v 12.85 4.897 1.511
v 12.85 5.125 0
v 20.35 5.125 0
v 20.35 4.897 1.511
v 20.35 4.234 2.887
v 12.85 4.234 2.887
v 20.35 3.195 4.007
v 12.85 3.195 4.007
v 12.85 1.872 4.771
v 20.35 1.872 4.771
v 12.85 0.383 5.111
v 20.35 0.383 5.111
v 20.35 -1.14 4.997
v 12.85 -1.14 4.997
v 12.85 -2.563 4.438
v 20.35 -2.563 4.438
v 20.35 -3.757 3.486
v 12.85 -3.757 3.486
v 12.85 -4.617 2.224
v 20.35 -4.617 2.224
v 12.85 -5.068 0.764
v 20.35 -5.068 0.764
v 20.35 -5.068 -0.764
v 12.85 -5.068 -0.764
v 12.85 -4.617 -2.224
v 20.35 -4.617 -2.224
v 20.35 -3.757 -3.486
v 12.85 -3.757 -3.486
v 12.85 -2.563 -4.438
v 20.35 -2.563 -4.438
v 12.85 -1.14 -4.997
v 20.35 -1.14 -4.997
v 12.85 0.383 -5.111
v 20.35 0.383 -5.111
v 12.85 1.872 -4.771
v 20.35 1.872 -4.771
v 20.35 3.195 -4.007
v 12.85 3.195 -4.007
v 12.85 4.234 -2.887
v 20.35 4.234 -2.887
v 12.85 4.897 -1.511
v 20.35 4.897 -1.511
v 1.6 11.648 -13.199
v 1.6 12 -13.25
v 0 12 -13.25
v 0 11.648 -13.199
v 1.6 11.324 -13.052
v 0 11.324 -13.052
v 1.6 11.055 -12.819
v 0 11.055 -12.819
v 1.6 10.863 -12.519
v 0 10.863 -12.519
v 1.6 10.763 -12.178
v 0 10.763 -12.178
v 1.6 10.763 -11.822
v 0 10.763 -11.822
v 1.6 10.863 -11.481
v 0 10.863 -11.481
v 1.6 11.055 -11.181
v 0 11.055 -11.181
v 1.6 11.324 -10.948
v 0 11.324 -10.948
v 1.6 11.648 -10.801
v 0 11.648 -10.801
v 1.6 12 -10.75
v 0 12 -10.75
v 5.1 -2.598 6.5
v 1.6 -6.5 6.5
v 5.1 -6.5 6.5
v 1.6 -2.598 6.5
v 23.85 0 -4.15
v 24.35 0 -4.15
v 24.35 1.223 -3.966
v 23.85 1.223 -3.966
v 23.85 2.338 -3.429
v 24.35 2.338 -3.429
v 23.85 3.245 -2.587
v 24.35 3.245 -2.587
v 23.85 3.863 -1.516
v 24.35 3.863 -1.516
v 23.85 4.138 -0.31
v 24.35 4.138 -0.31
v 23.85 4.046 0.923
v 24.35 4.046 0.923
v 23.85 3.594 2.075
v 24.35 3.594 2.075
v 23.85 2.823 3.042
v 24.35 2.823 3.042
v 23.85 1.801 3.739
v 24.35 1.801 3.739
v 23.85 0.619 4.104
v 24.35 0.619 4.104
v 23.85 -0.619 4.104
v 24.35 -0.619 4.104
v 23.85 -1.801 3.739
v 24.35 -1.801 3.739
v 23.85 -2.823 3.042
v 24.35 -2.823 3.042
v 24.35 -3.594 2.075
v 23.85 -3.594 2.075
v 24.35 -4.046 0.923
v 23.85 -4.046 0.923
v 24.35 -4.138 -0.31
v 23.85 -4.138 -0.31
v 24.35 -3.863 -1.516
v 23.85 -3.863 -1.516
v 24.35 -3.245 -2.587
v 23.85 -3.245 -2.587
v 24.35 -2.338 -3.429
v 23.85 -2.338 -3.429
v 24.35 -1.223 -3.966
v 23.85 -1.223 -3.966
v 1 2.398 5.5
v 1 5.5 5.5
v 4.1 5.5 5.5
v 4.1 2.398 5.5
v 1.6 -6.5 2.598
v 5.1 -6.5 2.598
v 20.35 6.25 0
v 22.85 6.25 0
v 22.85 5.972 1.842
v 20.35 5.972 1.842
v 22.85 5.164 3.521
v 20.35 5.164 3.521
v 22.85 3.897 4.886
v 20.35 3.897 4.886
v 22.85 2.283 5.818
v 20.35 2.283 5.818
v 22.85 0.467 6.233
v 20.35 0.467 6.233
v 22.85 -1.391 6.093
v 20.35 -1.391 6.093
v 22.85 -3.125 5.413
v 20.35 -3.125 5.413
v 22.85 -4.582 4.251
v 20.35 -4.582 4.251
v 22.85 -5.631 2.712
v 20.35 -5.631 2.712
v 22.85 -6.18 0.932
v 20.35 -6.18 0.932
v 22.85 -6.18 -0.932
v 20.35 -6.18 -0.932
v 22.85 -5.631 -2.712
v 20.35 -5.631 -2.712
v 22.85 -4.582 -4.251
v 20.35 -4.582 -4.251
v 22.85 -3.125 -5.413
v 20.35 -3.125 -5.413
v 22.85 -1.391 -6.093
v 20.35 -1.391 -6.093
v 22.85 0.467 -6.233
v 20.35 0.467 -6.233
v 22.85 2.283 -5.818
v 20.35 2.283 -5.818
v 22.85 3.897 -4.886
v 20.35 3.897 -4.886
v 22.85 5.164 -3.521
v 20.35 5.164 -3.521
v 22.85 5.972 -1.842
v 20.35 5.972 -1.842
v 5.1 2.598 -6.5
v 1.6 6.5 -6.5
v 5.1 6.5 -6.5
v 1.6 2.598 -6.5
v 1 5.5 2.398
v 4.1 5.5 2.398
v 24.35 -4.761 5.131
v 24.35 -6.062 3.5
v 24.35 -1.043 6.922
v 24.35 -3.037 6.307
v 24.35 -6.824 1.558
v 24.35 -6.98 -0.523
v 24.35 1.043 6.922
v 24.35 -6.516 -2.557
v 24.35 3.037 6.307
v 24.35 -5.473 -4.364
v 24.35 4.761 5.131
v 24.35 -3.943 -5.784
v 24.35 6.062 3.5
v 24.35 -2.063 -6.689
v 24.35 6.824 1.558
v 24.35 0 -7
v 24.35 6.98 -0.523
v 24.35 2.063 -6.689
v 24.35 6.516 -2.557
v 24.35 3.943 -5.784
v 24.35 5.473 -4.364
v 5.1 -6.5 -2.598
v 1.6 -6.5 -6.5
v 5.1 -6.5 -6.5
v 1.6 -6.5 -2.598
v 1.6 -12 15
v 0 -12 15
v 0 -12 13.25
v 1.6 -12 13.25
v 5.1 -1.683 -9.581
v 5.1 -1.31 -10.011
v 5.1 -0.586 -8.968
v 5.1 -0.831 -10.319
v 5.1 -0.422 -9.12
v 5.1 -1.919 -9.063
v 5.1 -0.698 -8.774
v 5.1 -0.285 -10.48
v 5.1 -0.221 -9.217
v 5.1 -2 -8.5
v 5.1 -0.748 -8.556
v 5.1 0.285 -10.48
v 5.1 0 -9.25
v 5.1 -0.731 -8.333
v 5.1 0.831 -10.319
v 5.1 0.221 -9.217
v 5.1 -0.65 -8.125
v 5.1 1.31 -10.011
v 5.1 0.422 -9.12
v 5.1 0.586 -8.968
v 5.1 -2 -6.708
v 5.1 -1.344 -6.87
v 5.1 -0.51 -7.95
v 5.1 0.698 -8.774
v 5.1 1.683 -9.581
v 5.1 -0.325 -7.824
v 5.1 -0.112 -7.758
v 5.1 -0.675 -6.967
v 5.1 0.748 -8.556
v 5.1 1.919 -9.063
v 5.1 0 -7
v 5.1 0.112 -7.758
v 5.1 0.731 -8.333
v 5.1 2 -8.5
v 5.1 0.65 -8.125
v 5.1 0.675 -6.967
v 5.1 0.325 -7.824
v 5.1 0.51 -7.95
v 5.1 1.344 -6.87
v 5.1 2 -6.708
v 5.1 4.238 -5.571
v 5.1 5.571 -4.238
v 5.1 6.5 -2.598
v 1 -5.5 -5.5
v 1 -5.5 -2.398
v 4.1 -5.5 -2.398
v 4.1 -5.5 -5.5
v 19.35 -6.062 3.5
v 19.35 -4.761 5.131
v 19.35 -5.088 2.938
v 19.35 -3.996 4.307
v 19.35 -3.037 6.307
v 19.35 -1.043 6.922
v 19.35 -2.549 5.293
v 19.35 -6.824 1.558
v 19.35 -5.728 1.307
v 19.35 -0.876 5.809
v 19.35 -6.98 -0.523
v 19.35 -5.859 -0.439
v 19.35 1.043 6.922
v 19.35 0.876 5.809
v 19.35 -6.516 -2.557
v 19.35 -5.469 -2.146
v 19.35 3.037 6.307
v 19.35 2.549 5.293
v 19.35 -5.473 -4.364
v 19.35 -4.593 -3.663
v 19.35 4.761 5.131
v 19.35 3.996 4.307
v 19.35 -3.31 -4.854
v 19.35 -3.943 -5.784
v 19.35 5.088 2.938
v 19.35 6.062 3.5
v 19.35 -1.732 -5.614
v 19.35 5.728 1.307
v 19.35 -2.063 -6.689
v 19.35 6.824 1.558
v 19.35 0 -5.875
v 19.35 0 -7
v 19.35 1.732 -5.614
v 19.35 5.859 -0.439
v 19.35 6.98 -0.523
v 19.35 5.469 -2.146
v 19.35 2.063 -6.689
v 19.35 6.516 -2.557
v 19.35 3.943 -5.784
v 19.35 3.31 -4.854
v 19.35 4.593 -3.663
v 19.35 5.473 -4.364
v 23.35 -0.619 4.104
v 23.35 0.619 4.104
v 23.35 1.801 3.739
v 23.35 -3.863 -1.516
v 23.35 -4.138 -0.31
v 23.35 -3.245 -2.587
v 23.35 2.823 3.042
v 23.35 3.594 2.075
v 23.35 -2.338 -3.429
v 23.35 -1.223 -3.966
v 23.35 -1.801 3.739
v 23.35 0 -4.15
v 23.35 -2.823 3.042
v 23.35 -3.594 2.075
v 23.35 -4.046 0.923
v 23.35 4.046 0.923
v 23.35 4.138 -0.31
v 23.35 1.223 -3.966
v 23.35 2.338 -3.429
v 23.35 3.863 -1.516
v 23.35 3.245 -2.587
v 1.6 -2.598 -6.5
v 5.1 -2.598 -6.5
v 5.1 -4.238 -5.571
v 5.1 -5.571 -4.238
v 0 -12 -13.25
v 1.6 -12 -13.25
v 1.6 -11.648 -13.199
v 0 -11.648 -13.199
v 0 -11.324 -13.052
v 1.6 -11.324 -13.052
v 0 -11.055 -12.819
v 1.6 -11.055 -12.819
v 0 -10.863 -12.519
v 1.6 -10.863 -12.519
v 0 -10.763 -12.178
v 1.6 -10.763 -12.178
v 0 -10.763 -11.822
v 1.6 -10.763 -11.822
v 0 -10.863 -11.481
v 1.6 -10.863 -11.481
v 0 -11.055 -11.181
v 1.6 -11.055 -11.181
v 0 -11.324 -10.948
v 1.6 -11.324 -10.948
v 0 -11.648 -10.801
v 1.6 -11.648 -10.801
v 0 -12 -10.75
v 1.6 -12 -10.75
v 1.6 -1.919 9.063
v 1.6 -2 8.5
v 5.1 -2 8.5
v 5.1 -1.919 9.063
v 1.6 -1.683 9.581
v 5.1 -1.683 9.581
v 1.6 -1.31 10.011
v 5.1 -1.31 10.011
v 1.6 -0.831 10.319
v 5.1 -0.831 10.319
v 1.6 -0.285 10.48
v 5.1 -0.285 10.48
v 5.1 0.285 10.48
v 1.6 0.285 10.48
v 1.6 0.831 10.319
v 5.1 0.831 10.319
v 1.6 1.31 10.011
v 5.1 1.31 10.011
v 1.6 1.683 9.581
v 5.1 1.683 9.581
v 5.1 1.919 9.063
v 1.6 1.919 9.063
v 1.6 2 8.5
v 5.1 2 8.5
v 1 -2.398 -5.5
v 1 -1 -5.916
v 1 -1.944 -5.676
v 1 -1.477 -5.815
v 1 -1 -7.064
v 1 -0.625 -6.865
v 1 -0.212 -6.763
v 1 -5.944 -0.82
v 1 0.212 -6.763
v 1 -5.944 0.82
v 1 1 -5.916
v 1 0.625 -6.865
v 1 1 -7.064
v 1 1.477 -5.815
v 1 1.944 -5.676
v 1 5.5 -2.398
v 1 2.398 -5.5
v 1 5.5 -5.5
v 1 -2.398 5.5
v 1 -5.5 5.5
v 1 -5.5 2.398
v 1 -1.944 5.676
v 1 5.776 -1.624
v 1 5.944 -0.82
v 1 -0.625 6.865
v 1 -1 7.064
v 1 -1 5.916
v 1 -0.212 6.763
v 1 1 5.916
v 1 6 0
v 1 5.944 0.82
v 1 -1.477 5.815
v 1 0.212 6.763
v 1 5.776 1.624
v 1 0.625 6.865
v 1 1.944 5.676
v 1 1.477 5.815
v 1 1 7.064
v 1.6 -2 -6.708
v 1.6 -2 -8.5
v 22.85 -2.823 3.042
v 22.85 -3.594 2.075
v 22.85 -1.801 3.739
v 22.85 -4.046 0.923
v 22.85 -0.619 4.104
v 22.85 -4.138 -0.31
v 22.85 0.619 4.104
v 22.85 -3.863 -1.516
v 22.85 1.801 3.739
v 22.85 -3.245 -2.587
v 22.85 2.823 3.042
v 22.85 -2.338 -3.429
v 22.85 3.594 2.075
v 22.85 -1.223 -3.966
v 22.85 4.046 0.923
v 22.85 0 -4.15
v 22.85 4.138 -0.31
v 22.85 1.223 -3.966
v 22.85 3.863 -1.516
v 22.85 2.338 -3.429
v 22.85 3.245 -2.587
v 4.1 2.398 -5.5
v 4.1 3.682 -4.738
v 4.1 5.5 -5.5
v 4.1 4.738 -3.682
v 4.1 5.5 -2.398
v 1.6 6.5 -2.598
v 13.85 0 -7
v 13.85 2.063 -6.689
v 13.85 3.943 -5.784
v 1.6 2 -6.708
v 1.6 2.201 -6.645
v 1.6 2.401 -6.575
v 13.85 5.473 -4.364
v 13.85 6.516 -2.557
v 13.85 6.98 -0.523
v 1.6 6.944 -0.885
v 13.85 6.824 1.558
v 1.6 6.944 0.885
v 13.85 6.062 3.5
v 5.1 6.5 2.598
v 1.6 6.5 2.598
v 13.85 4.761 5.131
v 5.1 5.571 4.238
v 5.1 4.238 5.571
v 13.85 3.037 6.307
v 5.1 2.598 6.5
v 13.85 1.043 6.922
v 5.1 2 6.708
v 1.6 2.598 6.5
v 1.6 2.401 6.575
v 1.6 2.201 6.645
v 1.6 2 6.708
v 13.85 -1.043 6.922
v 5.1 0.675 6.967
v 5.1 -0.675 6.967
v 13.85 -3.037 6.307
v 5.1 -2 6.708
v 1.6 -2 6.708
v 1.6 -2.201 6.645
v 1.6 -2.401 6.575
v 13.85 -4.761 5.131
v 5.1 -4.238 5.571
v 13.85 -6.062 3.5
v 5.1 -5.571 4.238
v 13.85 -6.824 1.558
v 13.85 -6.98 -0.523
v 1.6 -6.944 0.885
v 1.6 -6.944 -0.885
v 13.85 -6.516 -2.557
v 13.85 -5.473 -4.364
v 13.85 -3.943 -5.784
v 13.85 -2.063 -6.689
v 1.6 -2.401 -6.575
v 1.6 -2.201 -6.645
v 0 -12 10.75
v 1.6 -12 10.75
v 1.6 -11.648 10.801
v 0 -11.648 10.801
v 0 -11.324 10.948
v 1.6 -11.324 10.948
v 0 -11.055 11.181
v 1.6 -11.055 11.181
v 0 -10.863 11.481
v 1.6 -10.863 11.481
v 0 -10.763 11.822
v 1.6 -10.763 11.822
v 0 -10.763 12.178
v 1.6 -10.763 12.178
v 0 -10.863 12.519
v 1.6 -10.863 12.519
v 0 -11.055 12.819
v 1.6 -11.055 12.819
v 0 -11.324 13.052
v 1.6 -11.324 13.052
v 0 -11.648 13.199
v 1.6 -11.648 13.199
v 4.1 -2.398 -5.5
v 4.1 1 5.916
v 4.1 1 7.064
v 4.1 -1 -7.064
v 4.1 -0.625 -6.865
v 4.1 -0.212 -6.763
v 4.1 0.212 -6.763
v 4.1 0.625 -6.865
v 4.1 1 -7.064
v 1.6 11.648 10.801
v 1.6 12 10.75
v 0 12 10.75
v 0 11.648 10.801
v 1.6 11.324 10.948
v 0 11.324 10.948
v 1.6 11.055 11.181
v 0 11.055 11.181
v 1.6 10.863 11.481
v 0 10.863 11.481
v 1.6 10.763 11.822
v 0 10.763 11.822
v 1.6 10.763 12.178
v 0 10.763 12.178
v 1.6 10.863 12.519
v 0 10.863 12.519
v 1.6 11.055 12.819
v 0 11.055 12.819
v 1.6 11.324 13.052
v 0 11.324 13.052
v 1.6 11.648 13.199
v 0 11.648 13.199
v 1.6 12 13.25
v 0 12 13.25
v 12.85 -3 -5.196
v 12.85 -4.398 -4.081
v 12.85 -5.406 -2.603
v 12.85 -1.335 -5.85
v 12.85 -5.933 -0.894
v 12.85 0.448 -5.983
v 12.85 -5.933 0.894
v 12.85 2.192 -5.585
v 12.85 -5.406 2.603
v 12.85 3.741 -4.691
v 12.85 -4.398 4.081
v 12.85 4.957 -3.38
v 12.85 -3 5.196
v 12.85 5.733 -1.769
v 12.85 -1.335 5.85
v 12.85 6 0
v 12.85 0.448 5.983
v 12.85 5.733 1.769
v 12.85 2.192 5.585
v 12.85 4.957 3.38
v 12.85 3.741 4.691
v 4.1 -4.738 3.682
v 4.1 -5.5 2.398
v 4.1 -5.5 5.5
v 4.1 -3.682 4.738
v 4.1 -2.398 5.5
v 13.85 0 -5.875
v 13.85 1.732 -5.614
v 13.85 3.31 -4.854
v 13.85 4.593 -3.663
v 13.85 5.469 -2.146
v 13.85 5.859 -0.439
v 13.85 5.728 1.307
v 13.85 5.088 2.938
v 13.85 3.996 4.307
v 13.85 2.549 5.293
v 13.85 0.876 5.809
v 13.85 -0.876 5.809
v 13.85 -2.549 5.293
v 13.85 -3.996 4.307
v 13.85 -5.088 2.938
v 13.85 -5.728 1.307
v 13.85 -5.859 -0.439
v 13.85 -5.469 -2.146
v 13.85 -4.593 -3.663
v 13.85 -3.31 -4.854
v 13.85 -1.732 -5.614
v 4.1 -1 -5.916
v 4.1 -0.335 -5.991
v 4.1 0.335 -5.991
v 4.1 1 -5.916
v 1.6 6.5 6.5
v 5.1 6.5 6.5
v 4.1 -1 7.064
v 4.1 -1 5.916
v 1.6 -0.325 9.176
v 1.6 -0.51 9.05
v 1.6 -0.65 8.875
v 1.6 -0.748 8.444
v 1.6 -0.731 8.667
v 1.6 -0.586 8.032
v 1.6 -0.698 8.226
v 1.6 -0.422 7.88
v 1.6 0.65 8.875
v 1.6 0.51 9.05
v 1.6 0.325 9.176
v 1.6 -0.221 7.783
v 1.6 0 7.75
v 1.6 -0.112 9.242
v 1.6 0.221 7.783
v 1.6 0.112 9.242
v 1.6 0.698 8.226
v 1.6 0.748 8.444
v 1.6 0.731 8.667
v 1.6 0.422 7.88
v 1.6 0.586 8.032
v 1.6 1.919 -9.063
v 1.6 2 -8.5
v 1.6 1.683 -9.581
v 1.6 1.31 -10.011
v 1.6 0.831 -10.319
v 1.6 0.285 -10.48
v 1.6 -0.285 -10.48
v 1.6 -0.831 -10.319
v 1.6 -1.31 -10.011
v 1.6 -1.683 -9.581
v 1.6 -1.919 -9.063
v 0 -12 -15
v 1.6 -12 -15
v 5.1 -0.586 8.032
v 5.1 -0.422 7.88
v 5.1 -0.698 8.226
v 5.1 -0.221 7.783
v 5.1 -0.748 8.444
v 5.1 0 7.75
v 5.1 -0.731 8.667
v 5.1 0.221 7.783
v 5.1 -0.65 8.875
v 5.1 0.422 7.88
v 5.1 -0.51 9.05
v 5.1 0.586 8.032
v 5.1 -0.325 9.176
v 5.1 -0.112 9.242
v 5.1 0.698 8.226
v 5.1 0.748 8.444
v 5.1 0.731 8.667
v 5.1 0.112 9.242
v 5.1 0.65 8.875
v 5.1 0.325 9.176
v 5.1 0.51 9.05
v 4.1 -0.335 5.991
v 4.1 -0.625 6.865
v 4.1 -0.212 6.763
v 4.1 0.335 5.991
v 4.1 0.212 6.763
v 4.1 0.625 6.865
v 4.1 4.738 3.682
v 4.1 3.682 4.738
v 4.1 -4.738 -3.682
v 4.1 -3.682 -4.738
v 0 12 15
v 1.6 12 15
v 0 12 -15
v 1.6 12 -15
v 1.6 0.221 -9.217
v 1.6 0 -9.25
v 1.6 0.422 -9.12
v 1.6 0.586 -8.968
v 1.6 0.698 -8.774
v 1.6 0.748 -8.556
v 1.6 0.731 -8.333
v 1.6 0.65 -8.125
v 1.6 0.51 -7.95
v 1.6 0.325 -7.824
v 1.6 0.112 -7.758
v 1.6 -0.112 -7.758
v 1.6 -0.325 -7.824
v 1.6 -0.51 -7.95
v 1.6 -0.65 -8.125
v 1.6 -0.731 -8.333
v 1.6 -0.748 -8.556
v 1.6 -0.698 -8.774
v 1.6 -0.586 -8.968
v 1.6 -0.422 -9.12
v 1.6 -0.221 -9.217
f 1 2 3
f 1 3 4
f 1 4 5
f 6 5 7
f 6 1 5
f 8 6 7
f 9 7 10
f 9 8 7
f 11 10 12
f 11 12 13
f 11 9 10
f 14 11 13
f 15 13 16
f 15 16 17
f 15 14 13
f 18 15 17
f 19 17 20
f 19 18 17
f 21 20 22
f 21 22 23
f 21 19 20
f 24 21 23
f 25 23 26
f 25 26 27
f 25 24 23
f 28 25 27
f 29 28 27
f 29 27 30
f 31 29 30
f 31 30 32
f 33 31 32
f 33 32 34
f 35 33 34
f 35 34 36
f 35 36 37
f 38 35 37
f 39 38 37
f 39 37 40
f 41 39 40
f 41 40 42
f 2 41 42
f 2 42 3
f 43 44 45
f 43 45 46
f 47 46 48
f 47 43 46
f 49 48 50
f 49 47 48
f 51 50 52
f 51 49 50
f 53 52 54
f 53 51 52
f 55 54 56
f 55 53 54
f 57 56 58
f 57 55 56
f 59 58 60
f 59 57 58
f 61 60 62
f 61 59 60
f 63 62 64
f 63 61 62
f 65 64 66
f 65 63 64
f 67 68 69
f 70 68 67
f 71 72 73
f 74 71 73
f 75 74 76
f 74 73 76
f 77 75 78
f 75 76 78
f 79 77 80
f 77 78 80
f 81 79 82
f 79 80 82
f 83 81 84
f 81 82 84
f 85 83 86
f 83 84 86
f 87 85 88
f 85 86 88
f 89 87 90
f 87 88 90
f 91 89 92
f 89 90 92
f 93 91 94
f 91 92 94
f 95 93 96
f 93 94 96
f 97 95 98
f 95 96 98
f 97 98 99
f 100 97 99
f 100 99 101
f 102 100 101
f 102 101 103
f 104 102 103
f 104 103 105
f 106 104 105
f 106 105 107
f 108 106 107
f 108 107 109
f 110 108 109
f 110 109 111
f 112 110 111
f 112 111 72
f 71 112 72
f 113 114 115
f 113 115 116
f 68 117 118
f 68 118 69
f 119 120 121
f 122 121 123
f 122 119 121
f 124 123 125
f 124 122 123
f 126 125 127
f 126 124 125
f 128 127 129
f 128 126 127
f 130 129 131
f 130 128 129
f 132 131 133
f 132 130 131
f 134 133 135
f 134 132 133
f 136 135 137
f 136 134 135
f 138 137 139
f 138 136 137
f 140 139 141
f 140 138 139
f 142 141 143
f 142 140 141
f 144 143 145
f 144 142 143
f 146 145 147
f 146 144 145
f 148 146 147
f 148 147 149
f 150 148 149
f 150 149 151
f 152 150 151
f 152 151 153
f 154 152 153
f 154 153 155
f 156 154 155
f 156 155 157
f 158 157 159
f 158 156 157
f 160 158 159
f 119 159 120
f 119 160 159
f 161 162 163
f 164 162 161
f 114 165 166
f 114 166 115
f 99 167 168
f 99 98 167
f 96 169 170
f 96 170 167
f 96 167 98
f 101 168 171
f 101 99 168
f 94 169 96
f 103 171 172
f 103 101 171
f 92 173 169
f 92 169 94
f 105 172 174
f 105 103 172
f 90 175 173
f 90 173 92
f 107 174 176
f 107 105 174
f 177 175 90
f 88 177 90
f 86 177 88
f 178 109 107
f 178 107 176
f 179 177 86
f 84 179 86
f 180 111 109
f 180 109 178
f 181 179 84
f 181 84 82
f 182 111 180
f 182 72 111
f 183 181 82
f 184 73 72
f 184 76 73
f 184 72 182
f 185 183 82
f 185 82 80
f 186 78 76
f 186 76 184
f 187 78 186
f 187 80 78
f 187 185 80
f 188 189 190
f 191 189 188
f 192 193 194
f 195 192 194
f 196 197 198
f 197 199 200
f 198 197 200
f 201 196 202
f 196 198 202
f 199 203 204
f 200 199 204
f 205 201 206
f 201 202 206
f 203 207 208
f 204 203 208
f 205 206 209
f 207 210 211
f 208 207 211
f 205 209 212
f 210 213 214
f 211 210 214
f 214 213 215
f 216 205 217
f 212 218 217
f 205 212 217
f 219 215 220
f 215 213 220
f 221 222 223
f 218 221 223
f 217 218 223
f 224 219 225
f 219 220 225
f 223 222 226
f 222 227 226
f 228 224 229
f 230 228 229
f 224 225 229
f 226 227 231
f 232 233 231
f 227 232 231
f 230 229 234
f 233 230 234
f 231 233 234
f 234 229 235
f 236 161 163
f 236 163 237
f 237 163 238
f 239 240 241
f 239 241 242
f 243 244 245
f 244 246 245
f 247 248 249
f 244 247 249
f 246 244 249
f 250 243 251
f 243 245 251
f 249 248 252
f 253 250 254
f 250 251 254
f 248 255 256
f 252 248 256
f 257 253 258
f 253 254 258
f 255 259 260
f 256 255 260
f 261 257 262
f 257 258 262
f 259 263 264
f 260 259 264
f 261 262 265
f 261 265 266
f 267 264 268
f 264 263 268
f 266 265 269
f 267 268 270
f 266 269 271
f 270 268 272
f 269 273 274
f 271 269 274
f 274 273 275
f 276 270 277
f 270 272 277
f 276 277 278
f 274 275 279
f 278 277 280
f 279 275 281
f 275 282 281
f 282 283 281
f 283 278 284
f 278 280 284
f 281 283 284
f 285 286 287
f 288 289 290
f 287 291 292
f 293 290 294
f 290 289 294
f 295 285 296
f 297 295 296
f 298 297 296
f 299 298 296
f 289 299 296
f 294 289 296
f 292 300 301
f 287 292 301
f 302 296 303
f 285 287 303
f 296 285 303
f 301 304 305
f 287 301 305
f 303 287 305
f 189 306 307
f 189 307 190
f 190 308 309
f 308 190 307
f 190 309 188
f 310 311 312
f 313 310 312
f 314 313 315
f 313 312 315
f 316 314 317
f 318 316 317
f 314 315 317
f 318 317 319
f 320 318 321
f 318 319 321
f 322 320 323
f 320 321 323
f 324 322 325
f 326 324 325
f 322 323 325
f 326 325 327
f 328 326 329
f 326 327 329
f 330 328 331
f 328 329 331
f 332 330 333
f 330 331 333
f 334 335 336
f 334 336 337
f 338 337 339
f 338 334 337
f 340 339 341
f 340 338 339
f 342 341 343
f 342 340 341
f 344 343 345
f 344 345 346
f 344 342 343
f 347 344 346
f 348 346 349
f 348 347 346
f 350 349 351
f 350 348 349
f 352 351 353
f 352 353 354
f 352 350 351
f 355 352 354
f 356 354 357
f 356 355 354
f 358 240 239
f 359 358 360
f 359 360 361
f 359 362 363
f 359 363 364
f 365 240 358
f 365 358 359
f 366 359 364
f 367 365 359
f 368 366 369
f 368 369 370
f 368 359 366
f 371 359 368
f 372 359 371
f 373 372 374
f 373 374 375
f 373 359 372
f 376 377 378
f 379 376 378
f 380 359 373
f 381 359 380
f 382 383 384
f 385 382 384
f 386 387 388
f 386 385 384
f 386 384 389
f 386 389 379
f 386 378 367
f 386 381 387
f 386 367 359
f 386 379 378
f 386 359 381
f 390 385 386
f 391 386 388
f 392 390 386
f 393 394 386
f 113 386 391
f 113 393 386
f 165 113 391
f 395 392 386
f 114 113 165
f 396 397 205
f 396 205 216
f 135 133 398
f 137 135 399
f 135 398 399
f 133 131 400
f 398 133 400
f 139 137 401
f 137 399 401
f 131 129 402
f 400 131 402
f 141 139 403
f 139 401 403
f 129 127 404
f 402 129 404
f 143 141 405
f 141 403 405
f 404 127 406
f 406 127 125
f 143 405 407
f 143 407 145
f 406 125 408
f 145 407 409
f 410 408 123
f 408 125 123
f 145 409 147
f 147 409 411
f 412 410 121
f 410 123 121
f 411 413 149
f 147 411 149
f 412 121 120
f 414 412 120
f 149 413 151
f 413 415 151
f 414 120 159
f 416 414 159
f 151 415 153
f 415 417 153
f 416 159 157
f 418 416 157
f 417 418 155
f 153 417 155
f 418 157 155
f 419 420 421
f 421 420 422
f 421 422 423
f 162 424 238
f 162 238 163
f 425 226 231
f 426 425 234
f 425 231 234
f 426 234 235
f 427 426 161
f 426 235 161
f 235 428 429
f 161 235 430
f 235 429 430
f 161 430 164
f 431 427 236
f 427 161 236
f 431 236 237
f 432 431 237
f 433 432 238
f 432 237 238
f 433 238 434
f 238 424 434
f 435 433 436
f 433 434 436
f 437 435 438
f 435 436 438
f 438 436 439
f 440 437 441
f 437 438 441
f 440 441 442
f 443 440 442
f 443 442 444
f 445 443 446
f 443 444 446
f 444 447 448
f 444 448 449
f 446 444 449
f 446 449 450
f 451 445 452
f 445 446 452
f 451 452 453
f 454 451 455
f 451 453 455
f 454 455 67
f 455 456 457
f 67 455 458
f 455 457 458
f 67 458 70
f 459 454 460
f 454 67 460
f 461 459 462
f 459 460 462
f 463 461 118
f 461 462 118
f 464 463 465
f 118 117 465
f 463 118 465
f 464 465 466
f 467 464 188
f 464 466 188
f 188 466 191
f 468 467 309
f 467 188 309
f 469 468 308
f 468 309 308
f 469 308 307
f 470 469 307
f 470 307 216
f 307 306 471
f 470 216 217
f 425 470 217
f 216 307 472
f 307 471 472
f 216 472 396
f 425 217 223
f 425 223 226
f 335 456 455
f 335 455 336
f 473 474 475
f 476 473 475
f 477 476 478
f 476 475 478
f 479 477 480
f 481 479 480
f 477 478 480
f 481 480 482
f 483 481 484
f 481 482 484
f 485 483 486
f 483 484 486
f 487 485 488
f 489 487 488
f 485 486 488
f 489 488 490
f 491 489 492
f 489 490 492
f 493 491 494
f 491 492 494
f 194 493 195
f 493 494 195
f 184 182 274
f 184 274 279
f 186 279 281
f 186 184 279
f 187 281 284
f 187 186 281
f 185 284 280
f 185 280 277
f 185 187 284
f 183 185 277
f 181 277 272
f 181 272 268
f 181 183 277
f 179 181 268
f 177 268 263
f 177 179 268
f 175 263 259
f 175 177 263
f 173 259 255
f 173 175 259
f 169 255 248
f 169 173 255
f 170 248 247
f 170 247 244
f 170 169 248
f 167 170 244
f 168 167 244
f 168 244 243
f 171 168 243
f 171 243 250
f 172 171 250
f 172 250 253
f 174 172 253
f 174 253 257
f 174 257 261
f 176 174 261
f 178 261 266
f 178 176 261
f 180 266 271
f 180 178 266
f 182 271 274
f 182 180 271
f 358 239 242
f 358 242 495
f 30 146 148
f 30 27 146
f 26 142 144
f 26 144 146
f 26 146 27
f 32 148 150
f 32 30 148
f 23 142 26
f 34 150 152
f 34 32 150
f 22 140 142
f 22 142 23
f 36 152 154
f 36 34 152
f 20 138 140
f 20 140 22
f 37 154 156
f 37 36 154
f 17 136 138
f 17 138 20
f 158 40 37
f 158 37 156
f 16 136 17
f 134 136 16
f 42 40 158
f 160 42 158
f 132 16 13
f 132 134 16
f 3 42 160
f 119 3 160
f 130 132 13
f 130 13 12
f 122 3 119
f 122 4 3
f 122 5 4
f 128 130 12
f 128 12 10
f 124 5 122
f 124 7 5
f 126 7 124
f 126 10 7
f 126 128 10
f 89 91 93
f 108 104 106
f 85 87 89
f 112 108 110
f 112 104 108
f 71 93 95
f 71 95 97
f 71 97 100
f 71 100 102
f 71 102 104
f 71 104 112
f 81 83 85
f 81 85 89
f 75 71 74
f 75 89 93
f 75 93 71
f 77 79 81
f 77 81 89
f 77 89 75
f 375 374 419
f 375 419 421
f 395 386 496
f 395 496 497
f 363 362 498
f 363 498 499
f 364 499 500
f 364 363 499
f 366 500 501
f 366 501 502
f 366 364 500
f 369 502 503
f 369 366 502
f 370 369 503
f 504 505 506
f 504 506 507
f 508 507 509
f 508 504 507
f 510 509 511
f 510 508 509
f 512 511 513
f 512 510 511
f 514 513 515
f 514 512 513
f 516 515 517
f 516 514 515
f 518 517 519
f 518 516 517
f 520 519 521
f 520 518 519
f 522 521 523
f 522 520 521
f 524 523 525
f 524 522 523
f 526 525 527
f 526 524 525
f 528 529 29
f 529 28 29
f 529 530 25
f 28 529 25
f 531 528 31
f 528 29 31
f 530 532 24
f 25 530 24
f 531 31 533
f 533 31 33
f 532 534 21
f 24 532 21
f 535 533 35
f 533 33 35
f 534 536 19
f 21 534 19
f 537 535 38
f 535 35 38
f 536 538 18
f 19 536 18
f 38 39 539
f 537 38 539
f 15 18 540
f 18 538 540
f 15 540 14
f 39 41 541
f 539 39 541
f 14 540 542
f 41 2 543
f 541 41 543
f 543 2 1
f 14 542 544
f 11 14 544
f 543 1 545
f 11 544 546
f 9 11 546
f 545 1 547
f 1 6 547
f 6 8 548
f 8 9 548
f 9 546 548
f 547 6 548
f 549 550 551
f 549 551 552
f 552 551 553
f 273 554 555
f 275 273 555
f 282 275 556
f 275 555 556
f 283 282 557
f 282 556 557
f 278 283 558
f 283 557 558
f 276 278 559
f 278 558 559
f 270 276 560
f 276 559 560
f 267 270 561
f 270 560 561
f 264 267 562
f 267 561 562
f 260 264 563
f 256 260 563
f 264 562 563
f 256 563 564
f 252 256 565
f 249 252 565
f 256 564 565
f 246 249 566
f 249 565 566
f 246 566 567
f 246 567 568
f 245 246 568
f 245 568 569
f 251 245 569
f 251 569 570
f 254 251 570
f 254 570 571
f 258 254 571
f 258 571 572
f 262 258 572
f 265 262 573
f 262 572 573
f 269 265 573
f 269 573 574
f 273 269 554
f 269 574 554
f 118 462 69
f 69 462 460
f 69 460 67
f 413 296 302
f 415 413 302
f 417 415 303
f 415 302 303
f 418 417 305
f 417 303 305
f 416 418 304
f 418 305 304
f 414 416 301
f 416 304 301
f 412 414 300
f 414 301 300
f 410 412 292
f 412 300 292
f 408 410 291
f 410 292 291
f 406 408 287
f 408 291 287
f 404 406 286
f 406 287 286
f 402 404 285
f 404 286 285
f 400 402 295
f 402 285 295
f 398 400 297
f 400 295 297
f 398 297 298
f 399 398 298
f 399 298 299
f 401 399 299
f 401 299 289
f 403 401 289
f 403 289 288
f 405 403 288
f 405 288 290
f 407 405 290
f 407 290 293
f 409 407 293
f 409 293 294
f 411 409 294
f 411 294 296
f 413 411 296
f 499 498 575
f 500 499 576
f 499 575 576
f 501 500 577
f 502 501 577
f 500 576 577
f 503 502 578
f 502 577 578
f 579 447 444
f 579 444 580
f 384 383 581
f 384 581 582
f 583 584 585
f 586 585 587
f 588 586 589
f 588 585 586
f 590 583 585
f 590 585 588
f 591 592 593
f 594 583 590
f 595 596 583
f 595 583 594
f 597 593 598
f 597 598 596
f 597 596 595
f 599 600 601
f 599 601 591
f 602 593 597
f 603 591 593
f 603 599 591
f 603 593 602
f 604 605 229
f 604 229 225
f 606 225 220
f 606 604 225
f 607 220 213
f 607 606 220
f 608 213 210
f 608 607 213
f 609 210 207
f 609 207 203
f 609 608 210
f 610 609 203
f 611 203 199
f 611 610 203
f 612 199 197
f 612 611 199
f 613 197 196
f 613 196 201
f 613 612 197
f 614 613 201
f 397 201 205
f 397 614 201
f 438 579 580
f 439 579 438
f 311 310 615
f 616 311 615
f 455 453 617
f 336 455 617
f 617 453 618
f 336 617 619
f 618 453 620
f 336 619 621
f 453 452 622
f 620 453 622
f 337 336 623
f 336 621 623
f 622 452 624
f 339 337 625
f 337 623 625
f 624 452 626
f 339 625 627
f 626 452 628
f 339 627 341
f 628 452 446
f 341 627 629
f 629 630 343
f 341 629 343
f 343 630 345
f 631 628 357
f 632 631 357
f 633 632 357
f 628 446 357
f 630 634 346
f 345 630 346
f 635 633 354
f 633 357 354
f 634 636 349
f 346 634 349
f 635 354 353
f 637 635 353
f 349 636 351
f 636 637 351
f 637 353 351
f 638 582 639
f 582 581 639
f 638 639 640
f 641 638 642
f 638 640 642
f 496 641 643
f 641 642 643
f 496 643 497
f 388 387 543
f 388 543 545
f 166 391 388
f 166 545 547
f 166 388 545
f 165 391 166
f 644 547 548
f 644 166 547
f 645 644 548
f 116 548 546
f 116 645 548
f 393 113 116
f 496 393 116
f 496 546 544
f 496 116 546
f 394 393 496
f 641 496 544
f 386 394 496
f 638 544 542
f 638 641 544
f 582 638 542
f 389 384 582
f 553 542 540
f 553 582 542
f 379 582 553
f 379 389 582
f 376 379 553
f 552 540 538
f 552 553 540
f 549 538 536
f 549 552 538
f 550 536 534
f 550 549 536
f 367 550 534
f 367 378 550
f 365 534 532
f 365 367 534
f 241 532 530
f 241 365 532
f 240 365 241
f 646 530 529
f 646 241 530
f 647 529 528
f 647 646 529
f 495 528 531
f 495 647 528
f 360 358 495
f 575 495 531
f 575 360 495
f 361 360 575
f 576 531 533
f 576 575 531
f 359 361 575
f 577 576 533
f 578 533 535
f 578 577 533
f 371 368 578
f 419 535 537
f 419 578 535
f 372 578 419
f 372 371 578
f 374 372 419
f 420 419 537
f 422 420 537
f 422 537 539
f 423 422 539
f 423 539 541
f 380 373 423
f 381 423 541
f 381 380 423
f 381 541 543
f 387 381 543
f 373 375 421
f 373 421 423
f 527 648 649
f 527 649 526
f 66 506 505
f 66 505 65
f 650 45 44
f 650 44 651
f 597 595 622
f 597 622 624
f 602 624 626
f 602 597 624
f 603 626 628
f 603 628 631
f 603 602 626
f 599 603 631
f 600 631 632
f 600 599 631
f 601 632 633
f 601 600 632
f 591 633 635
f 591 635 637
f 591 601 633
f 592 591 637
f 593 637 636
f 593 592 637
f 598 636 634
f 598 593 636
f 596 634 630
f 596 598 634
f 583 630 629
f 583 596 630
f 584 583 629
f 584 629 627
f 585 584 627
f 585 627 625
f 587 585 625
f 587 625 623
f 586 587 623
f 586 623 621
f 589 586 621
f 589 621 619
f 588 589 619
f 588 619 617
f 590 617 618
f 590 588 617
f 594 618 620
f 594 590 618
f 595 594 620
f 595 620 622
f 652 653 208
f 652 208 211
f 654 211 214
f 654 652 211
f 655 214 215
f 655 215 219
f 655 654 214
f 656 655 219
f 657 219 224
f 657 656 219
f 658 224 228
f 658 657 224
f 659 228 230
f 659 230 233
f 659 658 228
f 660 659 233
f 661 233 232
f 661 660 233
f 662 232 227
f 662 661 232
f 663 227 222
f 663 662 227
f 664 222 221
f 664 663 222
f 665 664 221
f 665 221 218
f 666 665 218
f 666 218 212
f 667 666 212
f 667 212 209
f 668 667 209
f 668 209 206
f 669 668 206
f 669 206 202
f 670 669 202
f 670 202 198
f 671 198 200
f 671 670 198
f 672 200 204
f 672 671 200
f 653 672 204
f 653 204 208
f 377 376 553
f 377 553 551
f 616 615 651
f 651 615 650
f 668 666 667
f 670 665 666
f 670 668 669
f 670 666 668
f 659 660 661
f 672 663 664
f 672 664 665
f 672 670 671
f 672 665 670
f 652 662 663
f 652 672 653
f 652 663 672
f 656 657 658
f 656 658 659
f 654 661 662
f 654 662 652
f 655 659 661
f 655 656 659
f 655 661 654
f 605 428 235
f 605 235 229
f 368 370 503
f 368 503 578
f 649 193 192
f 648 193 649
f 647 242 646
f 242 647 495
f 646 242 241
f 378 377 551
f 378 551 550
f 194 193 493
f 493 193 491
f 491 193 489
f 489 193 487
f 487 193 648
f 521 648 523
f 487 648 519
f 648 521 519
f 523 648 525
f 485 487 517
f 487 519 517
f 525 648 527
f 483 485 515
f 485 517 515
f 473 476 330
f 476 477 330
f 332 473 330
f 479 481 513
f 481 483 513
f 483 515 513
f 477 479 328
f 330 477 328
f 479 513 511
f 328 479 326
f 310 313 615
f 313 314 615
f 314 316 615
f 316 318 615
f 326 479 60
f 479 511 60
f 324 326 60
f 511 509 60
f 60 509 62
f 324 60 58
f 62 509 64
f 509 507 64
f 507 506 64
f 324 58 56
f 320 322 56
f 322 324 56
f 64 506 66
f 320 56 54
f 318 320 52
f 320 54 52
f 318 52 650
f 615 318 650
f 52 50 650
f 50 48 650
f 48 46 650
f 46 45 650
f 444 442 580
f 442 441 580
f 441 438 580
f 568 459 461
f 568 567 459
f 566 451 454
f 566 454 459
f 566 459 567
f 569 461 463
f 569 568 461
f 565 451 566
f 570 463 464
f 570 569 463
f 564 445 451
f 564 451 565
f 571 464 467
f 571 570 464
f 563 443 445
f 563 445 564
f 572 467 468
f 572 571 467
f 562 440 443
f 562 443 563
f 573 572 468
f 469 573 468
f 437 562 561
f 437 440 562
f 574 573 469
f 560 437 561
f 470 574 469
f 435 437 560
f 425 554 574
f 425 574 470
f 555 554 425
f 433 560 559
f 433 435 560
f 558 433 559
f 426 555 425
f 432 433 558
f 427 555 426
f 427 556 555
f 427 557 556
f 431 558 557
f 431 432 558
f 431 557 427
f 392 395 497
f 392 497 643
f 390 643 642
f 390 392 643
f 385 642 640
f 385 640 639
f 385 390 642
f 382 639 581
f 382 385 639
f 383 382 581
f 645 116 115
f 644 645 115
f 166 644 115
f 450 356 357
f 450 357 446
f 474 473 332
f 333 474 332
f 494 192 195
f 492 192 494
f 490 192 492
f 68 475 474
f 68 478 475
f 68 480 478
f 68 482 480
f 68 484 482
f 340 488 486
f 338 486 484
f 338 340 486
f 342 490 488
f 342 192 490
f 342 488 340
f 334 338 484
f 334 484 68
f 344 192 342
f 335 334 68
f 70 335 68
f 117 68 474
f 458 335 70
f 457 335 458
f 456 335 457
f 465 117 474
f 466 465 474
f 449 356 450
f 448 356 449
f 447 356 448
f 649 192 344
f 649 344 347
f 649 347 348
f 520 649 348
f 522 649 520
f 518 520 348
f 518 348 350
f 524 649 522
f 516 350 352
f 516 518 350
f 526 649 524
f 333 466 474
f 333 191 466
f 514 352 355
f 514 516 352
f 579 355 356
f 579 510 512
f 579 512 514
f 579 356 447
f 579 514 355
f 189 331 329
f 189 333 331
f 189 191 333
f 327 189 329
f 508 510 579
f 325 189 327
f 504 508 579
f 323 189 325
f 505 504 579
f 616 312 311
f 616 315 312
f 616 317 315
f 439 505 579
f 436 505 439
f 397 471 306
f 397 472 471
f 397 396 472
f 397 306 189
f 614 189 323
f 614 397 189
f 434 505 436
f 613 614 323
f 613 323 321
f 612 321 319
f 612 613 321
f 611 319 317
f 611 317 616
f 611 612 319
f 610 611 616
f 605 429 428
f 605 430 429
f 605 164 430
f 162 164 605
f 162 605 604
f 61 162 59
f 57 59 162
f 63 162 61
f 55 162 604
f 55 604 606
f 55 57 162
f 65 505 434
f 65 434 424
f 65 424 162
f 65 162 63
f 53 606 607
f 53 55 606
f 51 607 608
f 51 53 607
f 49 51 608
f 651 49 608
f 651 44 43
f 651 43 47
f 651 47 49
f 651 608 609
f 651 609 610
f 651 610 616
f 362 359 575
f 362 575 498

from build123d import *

# Parameters (mm, degrees)
CROQUIS_BASE_W               = 30
CROQUIS_BASE_H               = 24
PLACA_ELECTRONICA_DEPTH      = 1.6
CORTAR_EXTRUIR3_DEPTH        = 20.275891678
CROQUIS_MONTAJE_CAMARA_R     = 0.75
SALIENTE_EXTRUIR2_DEPTH      = 3.5
SALIENTE_EXTRUIR3_DEPTH      = 8.75
SALIENTE_EXTRUIR3_DEPTH_BACK = 3.5
CAMERA_STAGE_1_R             = 7
CAMERA_STAGE_2_R             = 5.875
SALIENTE_EXTRUIR4_DEPTH      = 5.5
SALIENTE_EXTRUIR5_START      = 5
CAMERA_STAGE_3_R             = 7
SALIENTE_EXTRUIR5_DEPTH      = 5
VACIADO5_START               = 1
VACIADO5_OUTLINE_R           = 5.125
VACIADO5_DEPTH               = 23.35
VACIADO5_2_OUTLINE_R         = 6
VACIADO5_2_OUTLINE_R_2       = 5.125
VACIADO5_2_DEPTH             = 11.85
VACIADO5_START_2             = 20.35
VACIADO5_3_OUTLINE_R         = 6.25
VACIADO5_3_OUTLINE_R_2       = 5.125
VACIADO5_3_DEPTH             = 4
VACIADO5_4_DEPTH             = 3.1
SALIENTE_EXTRUIR6_START      = -1.5
CROQUIS_LENTE_R              = 6.25
SALIENTE_EXTRUIR6_DEPTH      = 1.5
CROQUIS_LENTE_3_R            = 4.15
CORTAR_EXTRUIR2_DEPTH        = 1.5
SALIENTE_EXTRUIR7_START      = 0.5
CROQUIS_DEL_LENTE_R          = 4.15
SALIENTE_EXTRUIR7_DEPTH      = 0.5


# Read off the part's stored shape, not the designer's step: Vaciado5
with BuildPart() as part:
    # Croquis base → Placa electronica (new body)
    with BuildSketch(Plane(origin=(0, 0, 0), x_dir=(0, 0, -1), z_dir=(1, 0, 0))):
        Rectangle(CROQUIS_BASE_W, CROQUIS_BASE_H)
    extrude(amount=PLACA_ELECTRONICA_DEPTH)

    # Croquis barrenos → Cortar-Extruir3 (cut, through all)
    with BuildSketch(Plane(origin=(1.6, 0, 0), x_dir=(0, 0, -1), z_dir=(1, 0, 0))):
        with BuildLine():
            Line((-13.25, 12), (-10.75, 12))
            ThreePointArc((-10.75, 12), (-12, 10.75), (-13.25, 12))
        make_face()
        with BuildLine():
            Line((-13.25, -12), (-10.75, -12))
            ThreePointArc((-10.75, -12), (-12, -10.75), (-13.25, -12))
        make_face()
        with BuildLine():
            Line((10.75, 12), (13.25, 12))
            ThreePointArc((13.25, 12), (12, 10.75), (10.75, 12))
        make_face()
        with BuildLine():
            Line((10.75, -12), (13.25, -12))
            ThreePointArc((13.25, -12), (12, -10.75), (10.75, -12))
        make_face()
    extrude(amount=-CORTAR_EXTRUIR3_DEPTH, mode=Mode.SUBTRACT)

    # Croquis montaje camara → Saliente-Extruir2 (add)
    with BuildSketch(Plane(origin=(1.6, 0, 0), x_dir=(0, 0, -1), z_dir=(1, 0, 0))):
        with BuildLine():
            Line((-6.5, 6.5), (6.5, 6.5))
            Line((6.5, 6.5), (6.5, 2))
            Line((6.5, 2), (8.5, 2))
            ThreePointArc((8.5, 2), (10.5, 0), (8.5, -2))
            Line((8.5, -2), (6.5, -2))
            Line((6.5, -2), (6.5, -6.5))
            Line((6.5, -6.5), (-6.5, -6.5))
            Line((-6.5, -6.5), (-6.5, -2))
            Line((-6.5, -2), (-8.5, -2))
            ThreePointArc((-8.5, -2), (-10.5, 0), (-8.5, 2))
            Line((-8.5, 2), (-6.5, 2))
            Line((-6.5, 2), (-6.5, 6.5))
        make_face()
        with Locations((-8.5, 0)):
            Circle(CROQUIS_MONTAJE_CAMARA_R, mode=Mode.SUBTRACT)
        with Locations((8.5, 0)):
            Circle(CROQUIS_MONTAJE_CAMARA_R, mode=Mode.SUBTRACT)
    extrude(amount=SALIENTE_EXTRUIR2_DEPTH)

    # Camera Stage 1 → Saliente-Extruir3 (add, two sides: drawn at the far end of the back side and taken through both)
    with BuildSketch(Plane(origin=(5.1, 0, 0), x_dir=(0, 0, -1), z_dir=(1, 0, 0)).offset(-SALIENTE_EXTRUIR3_DEPTH_BACK)):
        Circle(CAMERA_STAGE_1_R)
    extrude(amount=SALIENTE_EXTRUIR3_DEPTH + SALIENTE_EXTRUIR3_DEPTH_BACK)

    # Camera Stage 2 → Saliente-Extruir4 (add)
    with BuildSketch(Plane(origin=(13.85, 0, 0), x_dir=(0, 0, -1), z_dir=(1, 0, 0))):
        Circle(CAMERA_STAGE_2_R)
    extrude(amount=SALIENTE_EXTRUIR4_DEPTH)

    # Camera Stage 3 → Saliente-Extruir5 (add)
    with BuildSketch(Plane(origin=(19.35, 0, 0), x_dir=(0, 0, -1), z_dir=(1, 0, 0)).offset(SALIENTE_EXTRUIR5_START)):
        Circle(CAMERA_STAGE_3_R)
    extrude(amount=-SALIENTE_EXTRUIR5_DEPTH)

    # Vaciado5 outline → Vaciado5 (cut)
    with BuildSketch(Plane.YZ.offset(VACIADO5_START)):
        Circle(VACIADO5_OUTLINE_R)
    extrude(amount=VACIADO5_DEPTH, mode=Mode.SUBTRACT)

    # Vaciado5 2 outline → Vaciado5 2 (cut)
    with BuildSketch(Plane.YZ.offset(VACIADO5_START)):
        Circle(VACIADO5_2_OUTLINE_R)
        Circle(VACIADO5_2_OUTLINE_R_2, mode=Mode.SUBTRACT)
    extrude(amount=VACIADO5_2_DEPTH, mode=Mode.SUBTRACT)

    # Vaciado5 3 outline → Vaciado5 3 (cut)
    with BuildSketch(Plane.YZ.offset(VACIADO5_START_2)):
        Circle(VACIADO5_3_OUTLINE_R)
        Circle(VACIADO5_3_OUTLINE_R_2, mode=Mode.SUBTRACT)
    extrude(amount=VACIADO5_3_DEPTH, mode=Mode.SUBTRACT)

    # Vaciado5 4 outline → Vaciado5 4 (cut)
    with BuildSketch(Plane.YZ.offset(VACIADO5_START)):
        with BuildLine():
            ThreePointArc((-1, 5.916079783), (0, 6), (1, 5.916079783))
            Line((1, 5.916079783), (1, 7.063859338))
            ThreePointArc((1, 7.063859338), (0, 6.75), (-1, 7.063859338))
            Line((-1, 7.063859338), (-1, 5.916079783))
        make_face()
        with BuildLine():
            ThreePointArc((-5.5, 2.397915762), (-4.242640687, 4.242640687), (-2.397915762, 5.5))
            Line((-2.397915762, 5.5), (-5.5, 5.5))
            Line((-5.5, 5.5), (-5.5, 2.397915762))
        make_face()
        with BuildLine():
            ThreePointArc((2.397915762, 5.5), (4.242640687, 4.242640687), (5.5, 2.397915762))
            Line((5.5, 2.397915762), (5.5, 5.5))
            Line((5.5, 5.5), (2.397915762, 5.5))
        make_face()
        with BuildLine():
            ThreePointArc((-2.397915762, -5.5), (-4.242640687, -4.242640687), (-5.5, -2.397915762))
            Line((-5.5, -2.397915762), (-5.5, -5.5))
            Line((-5.5, -5.5), (-2.397915762, -5.5))
        make_face()
        with BuildLine():
            ThreePointArc((5.5, -2.397915762), (4.242640687, -4.242640687), (2.397915762, -5.5))
            Line((2.397915762, -5.5), (5.5, -5.5))
            Line((5.5, -5.5), (5.5, -2.397915762))
        make_face()
        with BuildLine():
            ThreePointArc((1, -5.916079783), (0, -6), (-1, -5.916079783))
            Line((-1, -5.916079783), (-1, -7.063859338))
            ThreePointArc((-1, -7.063859338), (0, -6.75), (1, -7.063859338))
            Line((1, -7.063859338), (1, -5.916079783))
        make_face()
    extrude(amount=VACIADO5_4_DEPTH, mode=Mode.SUBTRACT)

    # Croquis lente → Saliente-Extruir6 (add)
    with BuildSketch(Plane(origin=(24.35, 0, 0), x_dir=(0, 0, -1), z_dir=(1, 0, 0)).offset(SALIENTE_EXTRUIR6_START)):
        Circle(CROQUIS_LENTE_R)
    extrude(amount=SALIENTE_EXTRUIR6_DEPTH)

    # Croquis lente<3> → Cortar-Extruir2 (cut)
    with BuildSketch(Plane(origin=(24.35, 0, 0), x_dir=(0, 0, -1), z_dir=(1, 0, 0))):
        Circle(CROQUIS_LENTE_3_R)
    extrude(amount=-CORTAR_EXTRUIR2_DEPTH, mode=Mode.SUBTRACT)

    # Croquis del lente → Saliente-Extruir7 (add)
    with BuildSketch(Plane(origin=(23.35, 0, 0), x_dir=(0, 0, -1), z_dir=(1, 0, 0)).offset(SALIENTE_EXTRUIR7_START)):
        Circle(CROQUIS_DEL_LENTE_R)
    extrude(amount=-SALIENTE_EXTRUIR7_DEPTH)


solid = part.part
